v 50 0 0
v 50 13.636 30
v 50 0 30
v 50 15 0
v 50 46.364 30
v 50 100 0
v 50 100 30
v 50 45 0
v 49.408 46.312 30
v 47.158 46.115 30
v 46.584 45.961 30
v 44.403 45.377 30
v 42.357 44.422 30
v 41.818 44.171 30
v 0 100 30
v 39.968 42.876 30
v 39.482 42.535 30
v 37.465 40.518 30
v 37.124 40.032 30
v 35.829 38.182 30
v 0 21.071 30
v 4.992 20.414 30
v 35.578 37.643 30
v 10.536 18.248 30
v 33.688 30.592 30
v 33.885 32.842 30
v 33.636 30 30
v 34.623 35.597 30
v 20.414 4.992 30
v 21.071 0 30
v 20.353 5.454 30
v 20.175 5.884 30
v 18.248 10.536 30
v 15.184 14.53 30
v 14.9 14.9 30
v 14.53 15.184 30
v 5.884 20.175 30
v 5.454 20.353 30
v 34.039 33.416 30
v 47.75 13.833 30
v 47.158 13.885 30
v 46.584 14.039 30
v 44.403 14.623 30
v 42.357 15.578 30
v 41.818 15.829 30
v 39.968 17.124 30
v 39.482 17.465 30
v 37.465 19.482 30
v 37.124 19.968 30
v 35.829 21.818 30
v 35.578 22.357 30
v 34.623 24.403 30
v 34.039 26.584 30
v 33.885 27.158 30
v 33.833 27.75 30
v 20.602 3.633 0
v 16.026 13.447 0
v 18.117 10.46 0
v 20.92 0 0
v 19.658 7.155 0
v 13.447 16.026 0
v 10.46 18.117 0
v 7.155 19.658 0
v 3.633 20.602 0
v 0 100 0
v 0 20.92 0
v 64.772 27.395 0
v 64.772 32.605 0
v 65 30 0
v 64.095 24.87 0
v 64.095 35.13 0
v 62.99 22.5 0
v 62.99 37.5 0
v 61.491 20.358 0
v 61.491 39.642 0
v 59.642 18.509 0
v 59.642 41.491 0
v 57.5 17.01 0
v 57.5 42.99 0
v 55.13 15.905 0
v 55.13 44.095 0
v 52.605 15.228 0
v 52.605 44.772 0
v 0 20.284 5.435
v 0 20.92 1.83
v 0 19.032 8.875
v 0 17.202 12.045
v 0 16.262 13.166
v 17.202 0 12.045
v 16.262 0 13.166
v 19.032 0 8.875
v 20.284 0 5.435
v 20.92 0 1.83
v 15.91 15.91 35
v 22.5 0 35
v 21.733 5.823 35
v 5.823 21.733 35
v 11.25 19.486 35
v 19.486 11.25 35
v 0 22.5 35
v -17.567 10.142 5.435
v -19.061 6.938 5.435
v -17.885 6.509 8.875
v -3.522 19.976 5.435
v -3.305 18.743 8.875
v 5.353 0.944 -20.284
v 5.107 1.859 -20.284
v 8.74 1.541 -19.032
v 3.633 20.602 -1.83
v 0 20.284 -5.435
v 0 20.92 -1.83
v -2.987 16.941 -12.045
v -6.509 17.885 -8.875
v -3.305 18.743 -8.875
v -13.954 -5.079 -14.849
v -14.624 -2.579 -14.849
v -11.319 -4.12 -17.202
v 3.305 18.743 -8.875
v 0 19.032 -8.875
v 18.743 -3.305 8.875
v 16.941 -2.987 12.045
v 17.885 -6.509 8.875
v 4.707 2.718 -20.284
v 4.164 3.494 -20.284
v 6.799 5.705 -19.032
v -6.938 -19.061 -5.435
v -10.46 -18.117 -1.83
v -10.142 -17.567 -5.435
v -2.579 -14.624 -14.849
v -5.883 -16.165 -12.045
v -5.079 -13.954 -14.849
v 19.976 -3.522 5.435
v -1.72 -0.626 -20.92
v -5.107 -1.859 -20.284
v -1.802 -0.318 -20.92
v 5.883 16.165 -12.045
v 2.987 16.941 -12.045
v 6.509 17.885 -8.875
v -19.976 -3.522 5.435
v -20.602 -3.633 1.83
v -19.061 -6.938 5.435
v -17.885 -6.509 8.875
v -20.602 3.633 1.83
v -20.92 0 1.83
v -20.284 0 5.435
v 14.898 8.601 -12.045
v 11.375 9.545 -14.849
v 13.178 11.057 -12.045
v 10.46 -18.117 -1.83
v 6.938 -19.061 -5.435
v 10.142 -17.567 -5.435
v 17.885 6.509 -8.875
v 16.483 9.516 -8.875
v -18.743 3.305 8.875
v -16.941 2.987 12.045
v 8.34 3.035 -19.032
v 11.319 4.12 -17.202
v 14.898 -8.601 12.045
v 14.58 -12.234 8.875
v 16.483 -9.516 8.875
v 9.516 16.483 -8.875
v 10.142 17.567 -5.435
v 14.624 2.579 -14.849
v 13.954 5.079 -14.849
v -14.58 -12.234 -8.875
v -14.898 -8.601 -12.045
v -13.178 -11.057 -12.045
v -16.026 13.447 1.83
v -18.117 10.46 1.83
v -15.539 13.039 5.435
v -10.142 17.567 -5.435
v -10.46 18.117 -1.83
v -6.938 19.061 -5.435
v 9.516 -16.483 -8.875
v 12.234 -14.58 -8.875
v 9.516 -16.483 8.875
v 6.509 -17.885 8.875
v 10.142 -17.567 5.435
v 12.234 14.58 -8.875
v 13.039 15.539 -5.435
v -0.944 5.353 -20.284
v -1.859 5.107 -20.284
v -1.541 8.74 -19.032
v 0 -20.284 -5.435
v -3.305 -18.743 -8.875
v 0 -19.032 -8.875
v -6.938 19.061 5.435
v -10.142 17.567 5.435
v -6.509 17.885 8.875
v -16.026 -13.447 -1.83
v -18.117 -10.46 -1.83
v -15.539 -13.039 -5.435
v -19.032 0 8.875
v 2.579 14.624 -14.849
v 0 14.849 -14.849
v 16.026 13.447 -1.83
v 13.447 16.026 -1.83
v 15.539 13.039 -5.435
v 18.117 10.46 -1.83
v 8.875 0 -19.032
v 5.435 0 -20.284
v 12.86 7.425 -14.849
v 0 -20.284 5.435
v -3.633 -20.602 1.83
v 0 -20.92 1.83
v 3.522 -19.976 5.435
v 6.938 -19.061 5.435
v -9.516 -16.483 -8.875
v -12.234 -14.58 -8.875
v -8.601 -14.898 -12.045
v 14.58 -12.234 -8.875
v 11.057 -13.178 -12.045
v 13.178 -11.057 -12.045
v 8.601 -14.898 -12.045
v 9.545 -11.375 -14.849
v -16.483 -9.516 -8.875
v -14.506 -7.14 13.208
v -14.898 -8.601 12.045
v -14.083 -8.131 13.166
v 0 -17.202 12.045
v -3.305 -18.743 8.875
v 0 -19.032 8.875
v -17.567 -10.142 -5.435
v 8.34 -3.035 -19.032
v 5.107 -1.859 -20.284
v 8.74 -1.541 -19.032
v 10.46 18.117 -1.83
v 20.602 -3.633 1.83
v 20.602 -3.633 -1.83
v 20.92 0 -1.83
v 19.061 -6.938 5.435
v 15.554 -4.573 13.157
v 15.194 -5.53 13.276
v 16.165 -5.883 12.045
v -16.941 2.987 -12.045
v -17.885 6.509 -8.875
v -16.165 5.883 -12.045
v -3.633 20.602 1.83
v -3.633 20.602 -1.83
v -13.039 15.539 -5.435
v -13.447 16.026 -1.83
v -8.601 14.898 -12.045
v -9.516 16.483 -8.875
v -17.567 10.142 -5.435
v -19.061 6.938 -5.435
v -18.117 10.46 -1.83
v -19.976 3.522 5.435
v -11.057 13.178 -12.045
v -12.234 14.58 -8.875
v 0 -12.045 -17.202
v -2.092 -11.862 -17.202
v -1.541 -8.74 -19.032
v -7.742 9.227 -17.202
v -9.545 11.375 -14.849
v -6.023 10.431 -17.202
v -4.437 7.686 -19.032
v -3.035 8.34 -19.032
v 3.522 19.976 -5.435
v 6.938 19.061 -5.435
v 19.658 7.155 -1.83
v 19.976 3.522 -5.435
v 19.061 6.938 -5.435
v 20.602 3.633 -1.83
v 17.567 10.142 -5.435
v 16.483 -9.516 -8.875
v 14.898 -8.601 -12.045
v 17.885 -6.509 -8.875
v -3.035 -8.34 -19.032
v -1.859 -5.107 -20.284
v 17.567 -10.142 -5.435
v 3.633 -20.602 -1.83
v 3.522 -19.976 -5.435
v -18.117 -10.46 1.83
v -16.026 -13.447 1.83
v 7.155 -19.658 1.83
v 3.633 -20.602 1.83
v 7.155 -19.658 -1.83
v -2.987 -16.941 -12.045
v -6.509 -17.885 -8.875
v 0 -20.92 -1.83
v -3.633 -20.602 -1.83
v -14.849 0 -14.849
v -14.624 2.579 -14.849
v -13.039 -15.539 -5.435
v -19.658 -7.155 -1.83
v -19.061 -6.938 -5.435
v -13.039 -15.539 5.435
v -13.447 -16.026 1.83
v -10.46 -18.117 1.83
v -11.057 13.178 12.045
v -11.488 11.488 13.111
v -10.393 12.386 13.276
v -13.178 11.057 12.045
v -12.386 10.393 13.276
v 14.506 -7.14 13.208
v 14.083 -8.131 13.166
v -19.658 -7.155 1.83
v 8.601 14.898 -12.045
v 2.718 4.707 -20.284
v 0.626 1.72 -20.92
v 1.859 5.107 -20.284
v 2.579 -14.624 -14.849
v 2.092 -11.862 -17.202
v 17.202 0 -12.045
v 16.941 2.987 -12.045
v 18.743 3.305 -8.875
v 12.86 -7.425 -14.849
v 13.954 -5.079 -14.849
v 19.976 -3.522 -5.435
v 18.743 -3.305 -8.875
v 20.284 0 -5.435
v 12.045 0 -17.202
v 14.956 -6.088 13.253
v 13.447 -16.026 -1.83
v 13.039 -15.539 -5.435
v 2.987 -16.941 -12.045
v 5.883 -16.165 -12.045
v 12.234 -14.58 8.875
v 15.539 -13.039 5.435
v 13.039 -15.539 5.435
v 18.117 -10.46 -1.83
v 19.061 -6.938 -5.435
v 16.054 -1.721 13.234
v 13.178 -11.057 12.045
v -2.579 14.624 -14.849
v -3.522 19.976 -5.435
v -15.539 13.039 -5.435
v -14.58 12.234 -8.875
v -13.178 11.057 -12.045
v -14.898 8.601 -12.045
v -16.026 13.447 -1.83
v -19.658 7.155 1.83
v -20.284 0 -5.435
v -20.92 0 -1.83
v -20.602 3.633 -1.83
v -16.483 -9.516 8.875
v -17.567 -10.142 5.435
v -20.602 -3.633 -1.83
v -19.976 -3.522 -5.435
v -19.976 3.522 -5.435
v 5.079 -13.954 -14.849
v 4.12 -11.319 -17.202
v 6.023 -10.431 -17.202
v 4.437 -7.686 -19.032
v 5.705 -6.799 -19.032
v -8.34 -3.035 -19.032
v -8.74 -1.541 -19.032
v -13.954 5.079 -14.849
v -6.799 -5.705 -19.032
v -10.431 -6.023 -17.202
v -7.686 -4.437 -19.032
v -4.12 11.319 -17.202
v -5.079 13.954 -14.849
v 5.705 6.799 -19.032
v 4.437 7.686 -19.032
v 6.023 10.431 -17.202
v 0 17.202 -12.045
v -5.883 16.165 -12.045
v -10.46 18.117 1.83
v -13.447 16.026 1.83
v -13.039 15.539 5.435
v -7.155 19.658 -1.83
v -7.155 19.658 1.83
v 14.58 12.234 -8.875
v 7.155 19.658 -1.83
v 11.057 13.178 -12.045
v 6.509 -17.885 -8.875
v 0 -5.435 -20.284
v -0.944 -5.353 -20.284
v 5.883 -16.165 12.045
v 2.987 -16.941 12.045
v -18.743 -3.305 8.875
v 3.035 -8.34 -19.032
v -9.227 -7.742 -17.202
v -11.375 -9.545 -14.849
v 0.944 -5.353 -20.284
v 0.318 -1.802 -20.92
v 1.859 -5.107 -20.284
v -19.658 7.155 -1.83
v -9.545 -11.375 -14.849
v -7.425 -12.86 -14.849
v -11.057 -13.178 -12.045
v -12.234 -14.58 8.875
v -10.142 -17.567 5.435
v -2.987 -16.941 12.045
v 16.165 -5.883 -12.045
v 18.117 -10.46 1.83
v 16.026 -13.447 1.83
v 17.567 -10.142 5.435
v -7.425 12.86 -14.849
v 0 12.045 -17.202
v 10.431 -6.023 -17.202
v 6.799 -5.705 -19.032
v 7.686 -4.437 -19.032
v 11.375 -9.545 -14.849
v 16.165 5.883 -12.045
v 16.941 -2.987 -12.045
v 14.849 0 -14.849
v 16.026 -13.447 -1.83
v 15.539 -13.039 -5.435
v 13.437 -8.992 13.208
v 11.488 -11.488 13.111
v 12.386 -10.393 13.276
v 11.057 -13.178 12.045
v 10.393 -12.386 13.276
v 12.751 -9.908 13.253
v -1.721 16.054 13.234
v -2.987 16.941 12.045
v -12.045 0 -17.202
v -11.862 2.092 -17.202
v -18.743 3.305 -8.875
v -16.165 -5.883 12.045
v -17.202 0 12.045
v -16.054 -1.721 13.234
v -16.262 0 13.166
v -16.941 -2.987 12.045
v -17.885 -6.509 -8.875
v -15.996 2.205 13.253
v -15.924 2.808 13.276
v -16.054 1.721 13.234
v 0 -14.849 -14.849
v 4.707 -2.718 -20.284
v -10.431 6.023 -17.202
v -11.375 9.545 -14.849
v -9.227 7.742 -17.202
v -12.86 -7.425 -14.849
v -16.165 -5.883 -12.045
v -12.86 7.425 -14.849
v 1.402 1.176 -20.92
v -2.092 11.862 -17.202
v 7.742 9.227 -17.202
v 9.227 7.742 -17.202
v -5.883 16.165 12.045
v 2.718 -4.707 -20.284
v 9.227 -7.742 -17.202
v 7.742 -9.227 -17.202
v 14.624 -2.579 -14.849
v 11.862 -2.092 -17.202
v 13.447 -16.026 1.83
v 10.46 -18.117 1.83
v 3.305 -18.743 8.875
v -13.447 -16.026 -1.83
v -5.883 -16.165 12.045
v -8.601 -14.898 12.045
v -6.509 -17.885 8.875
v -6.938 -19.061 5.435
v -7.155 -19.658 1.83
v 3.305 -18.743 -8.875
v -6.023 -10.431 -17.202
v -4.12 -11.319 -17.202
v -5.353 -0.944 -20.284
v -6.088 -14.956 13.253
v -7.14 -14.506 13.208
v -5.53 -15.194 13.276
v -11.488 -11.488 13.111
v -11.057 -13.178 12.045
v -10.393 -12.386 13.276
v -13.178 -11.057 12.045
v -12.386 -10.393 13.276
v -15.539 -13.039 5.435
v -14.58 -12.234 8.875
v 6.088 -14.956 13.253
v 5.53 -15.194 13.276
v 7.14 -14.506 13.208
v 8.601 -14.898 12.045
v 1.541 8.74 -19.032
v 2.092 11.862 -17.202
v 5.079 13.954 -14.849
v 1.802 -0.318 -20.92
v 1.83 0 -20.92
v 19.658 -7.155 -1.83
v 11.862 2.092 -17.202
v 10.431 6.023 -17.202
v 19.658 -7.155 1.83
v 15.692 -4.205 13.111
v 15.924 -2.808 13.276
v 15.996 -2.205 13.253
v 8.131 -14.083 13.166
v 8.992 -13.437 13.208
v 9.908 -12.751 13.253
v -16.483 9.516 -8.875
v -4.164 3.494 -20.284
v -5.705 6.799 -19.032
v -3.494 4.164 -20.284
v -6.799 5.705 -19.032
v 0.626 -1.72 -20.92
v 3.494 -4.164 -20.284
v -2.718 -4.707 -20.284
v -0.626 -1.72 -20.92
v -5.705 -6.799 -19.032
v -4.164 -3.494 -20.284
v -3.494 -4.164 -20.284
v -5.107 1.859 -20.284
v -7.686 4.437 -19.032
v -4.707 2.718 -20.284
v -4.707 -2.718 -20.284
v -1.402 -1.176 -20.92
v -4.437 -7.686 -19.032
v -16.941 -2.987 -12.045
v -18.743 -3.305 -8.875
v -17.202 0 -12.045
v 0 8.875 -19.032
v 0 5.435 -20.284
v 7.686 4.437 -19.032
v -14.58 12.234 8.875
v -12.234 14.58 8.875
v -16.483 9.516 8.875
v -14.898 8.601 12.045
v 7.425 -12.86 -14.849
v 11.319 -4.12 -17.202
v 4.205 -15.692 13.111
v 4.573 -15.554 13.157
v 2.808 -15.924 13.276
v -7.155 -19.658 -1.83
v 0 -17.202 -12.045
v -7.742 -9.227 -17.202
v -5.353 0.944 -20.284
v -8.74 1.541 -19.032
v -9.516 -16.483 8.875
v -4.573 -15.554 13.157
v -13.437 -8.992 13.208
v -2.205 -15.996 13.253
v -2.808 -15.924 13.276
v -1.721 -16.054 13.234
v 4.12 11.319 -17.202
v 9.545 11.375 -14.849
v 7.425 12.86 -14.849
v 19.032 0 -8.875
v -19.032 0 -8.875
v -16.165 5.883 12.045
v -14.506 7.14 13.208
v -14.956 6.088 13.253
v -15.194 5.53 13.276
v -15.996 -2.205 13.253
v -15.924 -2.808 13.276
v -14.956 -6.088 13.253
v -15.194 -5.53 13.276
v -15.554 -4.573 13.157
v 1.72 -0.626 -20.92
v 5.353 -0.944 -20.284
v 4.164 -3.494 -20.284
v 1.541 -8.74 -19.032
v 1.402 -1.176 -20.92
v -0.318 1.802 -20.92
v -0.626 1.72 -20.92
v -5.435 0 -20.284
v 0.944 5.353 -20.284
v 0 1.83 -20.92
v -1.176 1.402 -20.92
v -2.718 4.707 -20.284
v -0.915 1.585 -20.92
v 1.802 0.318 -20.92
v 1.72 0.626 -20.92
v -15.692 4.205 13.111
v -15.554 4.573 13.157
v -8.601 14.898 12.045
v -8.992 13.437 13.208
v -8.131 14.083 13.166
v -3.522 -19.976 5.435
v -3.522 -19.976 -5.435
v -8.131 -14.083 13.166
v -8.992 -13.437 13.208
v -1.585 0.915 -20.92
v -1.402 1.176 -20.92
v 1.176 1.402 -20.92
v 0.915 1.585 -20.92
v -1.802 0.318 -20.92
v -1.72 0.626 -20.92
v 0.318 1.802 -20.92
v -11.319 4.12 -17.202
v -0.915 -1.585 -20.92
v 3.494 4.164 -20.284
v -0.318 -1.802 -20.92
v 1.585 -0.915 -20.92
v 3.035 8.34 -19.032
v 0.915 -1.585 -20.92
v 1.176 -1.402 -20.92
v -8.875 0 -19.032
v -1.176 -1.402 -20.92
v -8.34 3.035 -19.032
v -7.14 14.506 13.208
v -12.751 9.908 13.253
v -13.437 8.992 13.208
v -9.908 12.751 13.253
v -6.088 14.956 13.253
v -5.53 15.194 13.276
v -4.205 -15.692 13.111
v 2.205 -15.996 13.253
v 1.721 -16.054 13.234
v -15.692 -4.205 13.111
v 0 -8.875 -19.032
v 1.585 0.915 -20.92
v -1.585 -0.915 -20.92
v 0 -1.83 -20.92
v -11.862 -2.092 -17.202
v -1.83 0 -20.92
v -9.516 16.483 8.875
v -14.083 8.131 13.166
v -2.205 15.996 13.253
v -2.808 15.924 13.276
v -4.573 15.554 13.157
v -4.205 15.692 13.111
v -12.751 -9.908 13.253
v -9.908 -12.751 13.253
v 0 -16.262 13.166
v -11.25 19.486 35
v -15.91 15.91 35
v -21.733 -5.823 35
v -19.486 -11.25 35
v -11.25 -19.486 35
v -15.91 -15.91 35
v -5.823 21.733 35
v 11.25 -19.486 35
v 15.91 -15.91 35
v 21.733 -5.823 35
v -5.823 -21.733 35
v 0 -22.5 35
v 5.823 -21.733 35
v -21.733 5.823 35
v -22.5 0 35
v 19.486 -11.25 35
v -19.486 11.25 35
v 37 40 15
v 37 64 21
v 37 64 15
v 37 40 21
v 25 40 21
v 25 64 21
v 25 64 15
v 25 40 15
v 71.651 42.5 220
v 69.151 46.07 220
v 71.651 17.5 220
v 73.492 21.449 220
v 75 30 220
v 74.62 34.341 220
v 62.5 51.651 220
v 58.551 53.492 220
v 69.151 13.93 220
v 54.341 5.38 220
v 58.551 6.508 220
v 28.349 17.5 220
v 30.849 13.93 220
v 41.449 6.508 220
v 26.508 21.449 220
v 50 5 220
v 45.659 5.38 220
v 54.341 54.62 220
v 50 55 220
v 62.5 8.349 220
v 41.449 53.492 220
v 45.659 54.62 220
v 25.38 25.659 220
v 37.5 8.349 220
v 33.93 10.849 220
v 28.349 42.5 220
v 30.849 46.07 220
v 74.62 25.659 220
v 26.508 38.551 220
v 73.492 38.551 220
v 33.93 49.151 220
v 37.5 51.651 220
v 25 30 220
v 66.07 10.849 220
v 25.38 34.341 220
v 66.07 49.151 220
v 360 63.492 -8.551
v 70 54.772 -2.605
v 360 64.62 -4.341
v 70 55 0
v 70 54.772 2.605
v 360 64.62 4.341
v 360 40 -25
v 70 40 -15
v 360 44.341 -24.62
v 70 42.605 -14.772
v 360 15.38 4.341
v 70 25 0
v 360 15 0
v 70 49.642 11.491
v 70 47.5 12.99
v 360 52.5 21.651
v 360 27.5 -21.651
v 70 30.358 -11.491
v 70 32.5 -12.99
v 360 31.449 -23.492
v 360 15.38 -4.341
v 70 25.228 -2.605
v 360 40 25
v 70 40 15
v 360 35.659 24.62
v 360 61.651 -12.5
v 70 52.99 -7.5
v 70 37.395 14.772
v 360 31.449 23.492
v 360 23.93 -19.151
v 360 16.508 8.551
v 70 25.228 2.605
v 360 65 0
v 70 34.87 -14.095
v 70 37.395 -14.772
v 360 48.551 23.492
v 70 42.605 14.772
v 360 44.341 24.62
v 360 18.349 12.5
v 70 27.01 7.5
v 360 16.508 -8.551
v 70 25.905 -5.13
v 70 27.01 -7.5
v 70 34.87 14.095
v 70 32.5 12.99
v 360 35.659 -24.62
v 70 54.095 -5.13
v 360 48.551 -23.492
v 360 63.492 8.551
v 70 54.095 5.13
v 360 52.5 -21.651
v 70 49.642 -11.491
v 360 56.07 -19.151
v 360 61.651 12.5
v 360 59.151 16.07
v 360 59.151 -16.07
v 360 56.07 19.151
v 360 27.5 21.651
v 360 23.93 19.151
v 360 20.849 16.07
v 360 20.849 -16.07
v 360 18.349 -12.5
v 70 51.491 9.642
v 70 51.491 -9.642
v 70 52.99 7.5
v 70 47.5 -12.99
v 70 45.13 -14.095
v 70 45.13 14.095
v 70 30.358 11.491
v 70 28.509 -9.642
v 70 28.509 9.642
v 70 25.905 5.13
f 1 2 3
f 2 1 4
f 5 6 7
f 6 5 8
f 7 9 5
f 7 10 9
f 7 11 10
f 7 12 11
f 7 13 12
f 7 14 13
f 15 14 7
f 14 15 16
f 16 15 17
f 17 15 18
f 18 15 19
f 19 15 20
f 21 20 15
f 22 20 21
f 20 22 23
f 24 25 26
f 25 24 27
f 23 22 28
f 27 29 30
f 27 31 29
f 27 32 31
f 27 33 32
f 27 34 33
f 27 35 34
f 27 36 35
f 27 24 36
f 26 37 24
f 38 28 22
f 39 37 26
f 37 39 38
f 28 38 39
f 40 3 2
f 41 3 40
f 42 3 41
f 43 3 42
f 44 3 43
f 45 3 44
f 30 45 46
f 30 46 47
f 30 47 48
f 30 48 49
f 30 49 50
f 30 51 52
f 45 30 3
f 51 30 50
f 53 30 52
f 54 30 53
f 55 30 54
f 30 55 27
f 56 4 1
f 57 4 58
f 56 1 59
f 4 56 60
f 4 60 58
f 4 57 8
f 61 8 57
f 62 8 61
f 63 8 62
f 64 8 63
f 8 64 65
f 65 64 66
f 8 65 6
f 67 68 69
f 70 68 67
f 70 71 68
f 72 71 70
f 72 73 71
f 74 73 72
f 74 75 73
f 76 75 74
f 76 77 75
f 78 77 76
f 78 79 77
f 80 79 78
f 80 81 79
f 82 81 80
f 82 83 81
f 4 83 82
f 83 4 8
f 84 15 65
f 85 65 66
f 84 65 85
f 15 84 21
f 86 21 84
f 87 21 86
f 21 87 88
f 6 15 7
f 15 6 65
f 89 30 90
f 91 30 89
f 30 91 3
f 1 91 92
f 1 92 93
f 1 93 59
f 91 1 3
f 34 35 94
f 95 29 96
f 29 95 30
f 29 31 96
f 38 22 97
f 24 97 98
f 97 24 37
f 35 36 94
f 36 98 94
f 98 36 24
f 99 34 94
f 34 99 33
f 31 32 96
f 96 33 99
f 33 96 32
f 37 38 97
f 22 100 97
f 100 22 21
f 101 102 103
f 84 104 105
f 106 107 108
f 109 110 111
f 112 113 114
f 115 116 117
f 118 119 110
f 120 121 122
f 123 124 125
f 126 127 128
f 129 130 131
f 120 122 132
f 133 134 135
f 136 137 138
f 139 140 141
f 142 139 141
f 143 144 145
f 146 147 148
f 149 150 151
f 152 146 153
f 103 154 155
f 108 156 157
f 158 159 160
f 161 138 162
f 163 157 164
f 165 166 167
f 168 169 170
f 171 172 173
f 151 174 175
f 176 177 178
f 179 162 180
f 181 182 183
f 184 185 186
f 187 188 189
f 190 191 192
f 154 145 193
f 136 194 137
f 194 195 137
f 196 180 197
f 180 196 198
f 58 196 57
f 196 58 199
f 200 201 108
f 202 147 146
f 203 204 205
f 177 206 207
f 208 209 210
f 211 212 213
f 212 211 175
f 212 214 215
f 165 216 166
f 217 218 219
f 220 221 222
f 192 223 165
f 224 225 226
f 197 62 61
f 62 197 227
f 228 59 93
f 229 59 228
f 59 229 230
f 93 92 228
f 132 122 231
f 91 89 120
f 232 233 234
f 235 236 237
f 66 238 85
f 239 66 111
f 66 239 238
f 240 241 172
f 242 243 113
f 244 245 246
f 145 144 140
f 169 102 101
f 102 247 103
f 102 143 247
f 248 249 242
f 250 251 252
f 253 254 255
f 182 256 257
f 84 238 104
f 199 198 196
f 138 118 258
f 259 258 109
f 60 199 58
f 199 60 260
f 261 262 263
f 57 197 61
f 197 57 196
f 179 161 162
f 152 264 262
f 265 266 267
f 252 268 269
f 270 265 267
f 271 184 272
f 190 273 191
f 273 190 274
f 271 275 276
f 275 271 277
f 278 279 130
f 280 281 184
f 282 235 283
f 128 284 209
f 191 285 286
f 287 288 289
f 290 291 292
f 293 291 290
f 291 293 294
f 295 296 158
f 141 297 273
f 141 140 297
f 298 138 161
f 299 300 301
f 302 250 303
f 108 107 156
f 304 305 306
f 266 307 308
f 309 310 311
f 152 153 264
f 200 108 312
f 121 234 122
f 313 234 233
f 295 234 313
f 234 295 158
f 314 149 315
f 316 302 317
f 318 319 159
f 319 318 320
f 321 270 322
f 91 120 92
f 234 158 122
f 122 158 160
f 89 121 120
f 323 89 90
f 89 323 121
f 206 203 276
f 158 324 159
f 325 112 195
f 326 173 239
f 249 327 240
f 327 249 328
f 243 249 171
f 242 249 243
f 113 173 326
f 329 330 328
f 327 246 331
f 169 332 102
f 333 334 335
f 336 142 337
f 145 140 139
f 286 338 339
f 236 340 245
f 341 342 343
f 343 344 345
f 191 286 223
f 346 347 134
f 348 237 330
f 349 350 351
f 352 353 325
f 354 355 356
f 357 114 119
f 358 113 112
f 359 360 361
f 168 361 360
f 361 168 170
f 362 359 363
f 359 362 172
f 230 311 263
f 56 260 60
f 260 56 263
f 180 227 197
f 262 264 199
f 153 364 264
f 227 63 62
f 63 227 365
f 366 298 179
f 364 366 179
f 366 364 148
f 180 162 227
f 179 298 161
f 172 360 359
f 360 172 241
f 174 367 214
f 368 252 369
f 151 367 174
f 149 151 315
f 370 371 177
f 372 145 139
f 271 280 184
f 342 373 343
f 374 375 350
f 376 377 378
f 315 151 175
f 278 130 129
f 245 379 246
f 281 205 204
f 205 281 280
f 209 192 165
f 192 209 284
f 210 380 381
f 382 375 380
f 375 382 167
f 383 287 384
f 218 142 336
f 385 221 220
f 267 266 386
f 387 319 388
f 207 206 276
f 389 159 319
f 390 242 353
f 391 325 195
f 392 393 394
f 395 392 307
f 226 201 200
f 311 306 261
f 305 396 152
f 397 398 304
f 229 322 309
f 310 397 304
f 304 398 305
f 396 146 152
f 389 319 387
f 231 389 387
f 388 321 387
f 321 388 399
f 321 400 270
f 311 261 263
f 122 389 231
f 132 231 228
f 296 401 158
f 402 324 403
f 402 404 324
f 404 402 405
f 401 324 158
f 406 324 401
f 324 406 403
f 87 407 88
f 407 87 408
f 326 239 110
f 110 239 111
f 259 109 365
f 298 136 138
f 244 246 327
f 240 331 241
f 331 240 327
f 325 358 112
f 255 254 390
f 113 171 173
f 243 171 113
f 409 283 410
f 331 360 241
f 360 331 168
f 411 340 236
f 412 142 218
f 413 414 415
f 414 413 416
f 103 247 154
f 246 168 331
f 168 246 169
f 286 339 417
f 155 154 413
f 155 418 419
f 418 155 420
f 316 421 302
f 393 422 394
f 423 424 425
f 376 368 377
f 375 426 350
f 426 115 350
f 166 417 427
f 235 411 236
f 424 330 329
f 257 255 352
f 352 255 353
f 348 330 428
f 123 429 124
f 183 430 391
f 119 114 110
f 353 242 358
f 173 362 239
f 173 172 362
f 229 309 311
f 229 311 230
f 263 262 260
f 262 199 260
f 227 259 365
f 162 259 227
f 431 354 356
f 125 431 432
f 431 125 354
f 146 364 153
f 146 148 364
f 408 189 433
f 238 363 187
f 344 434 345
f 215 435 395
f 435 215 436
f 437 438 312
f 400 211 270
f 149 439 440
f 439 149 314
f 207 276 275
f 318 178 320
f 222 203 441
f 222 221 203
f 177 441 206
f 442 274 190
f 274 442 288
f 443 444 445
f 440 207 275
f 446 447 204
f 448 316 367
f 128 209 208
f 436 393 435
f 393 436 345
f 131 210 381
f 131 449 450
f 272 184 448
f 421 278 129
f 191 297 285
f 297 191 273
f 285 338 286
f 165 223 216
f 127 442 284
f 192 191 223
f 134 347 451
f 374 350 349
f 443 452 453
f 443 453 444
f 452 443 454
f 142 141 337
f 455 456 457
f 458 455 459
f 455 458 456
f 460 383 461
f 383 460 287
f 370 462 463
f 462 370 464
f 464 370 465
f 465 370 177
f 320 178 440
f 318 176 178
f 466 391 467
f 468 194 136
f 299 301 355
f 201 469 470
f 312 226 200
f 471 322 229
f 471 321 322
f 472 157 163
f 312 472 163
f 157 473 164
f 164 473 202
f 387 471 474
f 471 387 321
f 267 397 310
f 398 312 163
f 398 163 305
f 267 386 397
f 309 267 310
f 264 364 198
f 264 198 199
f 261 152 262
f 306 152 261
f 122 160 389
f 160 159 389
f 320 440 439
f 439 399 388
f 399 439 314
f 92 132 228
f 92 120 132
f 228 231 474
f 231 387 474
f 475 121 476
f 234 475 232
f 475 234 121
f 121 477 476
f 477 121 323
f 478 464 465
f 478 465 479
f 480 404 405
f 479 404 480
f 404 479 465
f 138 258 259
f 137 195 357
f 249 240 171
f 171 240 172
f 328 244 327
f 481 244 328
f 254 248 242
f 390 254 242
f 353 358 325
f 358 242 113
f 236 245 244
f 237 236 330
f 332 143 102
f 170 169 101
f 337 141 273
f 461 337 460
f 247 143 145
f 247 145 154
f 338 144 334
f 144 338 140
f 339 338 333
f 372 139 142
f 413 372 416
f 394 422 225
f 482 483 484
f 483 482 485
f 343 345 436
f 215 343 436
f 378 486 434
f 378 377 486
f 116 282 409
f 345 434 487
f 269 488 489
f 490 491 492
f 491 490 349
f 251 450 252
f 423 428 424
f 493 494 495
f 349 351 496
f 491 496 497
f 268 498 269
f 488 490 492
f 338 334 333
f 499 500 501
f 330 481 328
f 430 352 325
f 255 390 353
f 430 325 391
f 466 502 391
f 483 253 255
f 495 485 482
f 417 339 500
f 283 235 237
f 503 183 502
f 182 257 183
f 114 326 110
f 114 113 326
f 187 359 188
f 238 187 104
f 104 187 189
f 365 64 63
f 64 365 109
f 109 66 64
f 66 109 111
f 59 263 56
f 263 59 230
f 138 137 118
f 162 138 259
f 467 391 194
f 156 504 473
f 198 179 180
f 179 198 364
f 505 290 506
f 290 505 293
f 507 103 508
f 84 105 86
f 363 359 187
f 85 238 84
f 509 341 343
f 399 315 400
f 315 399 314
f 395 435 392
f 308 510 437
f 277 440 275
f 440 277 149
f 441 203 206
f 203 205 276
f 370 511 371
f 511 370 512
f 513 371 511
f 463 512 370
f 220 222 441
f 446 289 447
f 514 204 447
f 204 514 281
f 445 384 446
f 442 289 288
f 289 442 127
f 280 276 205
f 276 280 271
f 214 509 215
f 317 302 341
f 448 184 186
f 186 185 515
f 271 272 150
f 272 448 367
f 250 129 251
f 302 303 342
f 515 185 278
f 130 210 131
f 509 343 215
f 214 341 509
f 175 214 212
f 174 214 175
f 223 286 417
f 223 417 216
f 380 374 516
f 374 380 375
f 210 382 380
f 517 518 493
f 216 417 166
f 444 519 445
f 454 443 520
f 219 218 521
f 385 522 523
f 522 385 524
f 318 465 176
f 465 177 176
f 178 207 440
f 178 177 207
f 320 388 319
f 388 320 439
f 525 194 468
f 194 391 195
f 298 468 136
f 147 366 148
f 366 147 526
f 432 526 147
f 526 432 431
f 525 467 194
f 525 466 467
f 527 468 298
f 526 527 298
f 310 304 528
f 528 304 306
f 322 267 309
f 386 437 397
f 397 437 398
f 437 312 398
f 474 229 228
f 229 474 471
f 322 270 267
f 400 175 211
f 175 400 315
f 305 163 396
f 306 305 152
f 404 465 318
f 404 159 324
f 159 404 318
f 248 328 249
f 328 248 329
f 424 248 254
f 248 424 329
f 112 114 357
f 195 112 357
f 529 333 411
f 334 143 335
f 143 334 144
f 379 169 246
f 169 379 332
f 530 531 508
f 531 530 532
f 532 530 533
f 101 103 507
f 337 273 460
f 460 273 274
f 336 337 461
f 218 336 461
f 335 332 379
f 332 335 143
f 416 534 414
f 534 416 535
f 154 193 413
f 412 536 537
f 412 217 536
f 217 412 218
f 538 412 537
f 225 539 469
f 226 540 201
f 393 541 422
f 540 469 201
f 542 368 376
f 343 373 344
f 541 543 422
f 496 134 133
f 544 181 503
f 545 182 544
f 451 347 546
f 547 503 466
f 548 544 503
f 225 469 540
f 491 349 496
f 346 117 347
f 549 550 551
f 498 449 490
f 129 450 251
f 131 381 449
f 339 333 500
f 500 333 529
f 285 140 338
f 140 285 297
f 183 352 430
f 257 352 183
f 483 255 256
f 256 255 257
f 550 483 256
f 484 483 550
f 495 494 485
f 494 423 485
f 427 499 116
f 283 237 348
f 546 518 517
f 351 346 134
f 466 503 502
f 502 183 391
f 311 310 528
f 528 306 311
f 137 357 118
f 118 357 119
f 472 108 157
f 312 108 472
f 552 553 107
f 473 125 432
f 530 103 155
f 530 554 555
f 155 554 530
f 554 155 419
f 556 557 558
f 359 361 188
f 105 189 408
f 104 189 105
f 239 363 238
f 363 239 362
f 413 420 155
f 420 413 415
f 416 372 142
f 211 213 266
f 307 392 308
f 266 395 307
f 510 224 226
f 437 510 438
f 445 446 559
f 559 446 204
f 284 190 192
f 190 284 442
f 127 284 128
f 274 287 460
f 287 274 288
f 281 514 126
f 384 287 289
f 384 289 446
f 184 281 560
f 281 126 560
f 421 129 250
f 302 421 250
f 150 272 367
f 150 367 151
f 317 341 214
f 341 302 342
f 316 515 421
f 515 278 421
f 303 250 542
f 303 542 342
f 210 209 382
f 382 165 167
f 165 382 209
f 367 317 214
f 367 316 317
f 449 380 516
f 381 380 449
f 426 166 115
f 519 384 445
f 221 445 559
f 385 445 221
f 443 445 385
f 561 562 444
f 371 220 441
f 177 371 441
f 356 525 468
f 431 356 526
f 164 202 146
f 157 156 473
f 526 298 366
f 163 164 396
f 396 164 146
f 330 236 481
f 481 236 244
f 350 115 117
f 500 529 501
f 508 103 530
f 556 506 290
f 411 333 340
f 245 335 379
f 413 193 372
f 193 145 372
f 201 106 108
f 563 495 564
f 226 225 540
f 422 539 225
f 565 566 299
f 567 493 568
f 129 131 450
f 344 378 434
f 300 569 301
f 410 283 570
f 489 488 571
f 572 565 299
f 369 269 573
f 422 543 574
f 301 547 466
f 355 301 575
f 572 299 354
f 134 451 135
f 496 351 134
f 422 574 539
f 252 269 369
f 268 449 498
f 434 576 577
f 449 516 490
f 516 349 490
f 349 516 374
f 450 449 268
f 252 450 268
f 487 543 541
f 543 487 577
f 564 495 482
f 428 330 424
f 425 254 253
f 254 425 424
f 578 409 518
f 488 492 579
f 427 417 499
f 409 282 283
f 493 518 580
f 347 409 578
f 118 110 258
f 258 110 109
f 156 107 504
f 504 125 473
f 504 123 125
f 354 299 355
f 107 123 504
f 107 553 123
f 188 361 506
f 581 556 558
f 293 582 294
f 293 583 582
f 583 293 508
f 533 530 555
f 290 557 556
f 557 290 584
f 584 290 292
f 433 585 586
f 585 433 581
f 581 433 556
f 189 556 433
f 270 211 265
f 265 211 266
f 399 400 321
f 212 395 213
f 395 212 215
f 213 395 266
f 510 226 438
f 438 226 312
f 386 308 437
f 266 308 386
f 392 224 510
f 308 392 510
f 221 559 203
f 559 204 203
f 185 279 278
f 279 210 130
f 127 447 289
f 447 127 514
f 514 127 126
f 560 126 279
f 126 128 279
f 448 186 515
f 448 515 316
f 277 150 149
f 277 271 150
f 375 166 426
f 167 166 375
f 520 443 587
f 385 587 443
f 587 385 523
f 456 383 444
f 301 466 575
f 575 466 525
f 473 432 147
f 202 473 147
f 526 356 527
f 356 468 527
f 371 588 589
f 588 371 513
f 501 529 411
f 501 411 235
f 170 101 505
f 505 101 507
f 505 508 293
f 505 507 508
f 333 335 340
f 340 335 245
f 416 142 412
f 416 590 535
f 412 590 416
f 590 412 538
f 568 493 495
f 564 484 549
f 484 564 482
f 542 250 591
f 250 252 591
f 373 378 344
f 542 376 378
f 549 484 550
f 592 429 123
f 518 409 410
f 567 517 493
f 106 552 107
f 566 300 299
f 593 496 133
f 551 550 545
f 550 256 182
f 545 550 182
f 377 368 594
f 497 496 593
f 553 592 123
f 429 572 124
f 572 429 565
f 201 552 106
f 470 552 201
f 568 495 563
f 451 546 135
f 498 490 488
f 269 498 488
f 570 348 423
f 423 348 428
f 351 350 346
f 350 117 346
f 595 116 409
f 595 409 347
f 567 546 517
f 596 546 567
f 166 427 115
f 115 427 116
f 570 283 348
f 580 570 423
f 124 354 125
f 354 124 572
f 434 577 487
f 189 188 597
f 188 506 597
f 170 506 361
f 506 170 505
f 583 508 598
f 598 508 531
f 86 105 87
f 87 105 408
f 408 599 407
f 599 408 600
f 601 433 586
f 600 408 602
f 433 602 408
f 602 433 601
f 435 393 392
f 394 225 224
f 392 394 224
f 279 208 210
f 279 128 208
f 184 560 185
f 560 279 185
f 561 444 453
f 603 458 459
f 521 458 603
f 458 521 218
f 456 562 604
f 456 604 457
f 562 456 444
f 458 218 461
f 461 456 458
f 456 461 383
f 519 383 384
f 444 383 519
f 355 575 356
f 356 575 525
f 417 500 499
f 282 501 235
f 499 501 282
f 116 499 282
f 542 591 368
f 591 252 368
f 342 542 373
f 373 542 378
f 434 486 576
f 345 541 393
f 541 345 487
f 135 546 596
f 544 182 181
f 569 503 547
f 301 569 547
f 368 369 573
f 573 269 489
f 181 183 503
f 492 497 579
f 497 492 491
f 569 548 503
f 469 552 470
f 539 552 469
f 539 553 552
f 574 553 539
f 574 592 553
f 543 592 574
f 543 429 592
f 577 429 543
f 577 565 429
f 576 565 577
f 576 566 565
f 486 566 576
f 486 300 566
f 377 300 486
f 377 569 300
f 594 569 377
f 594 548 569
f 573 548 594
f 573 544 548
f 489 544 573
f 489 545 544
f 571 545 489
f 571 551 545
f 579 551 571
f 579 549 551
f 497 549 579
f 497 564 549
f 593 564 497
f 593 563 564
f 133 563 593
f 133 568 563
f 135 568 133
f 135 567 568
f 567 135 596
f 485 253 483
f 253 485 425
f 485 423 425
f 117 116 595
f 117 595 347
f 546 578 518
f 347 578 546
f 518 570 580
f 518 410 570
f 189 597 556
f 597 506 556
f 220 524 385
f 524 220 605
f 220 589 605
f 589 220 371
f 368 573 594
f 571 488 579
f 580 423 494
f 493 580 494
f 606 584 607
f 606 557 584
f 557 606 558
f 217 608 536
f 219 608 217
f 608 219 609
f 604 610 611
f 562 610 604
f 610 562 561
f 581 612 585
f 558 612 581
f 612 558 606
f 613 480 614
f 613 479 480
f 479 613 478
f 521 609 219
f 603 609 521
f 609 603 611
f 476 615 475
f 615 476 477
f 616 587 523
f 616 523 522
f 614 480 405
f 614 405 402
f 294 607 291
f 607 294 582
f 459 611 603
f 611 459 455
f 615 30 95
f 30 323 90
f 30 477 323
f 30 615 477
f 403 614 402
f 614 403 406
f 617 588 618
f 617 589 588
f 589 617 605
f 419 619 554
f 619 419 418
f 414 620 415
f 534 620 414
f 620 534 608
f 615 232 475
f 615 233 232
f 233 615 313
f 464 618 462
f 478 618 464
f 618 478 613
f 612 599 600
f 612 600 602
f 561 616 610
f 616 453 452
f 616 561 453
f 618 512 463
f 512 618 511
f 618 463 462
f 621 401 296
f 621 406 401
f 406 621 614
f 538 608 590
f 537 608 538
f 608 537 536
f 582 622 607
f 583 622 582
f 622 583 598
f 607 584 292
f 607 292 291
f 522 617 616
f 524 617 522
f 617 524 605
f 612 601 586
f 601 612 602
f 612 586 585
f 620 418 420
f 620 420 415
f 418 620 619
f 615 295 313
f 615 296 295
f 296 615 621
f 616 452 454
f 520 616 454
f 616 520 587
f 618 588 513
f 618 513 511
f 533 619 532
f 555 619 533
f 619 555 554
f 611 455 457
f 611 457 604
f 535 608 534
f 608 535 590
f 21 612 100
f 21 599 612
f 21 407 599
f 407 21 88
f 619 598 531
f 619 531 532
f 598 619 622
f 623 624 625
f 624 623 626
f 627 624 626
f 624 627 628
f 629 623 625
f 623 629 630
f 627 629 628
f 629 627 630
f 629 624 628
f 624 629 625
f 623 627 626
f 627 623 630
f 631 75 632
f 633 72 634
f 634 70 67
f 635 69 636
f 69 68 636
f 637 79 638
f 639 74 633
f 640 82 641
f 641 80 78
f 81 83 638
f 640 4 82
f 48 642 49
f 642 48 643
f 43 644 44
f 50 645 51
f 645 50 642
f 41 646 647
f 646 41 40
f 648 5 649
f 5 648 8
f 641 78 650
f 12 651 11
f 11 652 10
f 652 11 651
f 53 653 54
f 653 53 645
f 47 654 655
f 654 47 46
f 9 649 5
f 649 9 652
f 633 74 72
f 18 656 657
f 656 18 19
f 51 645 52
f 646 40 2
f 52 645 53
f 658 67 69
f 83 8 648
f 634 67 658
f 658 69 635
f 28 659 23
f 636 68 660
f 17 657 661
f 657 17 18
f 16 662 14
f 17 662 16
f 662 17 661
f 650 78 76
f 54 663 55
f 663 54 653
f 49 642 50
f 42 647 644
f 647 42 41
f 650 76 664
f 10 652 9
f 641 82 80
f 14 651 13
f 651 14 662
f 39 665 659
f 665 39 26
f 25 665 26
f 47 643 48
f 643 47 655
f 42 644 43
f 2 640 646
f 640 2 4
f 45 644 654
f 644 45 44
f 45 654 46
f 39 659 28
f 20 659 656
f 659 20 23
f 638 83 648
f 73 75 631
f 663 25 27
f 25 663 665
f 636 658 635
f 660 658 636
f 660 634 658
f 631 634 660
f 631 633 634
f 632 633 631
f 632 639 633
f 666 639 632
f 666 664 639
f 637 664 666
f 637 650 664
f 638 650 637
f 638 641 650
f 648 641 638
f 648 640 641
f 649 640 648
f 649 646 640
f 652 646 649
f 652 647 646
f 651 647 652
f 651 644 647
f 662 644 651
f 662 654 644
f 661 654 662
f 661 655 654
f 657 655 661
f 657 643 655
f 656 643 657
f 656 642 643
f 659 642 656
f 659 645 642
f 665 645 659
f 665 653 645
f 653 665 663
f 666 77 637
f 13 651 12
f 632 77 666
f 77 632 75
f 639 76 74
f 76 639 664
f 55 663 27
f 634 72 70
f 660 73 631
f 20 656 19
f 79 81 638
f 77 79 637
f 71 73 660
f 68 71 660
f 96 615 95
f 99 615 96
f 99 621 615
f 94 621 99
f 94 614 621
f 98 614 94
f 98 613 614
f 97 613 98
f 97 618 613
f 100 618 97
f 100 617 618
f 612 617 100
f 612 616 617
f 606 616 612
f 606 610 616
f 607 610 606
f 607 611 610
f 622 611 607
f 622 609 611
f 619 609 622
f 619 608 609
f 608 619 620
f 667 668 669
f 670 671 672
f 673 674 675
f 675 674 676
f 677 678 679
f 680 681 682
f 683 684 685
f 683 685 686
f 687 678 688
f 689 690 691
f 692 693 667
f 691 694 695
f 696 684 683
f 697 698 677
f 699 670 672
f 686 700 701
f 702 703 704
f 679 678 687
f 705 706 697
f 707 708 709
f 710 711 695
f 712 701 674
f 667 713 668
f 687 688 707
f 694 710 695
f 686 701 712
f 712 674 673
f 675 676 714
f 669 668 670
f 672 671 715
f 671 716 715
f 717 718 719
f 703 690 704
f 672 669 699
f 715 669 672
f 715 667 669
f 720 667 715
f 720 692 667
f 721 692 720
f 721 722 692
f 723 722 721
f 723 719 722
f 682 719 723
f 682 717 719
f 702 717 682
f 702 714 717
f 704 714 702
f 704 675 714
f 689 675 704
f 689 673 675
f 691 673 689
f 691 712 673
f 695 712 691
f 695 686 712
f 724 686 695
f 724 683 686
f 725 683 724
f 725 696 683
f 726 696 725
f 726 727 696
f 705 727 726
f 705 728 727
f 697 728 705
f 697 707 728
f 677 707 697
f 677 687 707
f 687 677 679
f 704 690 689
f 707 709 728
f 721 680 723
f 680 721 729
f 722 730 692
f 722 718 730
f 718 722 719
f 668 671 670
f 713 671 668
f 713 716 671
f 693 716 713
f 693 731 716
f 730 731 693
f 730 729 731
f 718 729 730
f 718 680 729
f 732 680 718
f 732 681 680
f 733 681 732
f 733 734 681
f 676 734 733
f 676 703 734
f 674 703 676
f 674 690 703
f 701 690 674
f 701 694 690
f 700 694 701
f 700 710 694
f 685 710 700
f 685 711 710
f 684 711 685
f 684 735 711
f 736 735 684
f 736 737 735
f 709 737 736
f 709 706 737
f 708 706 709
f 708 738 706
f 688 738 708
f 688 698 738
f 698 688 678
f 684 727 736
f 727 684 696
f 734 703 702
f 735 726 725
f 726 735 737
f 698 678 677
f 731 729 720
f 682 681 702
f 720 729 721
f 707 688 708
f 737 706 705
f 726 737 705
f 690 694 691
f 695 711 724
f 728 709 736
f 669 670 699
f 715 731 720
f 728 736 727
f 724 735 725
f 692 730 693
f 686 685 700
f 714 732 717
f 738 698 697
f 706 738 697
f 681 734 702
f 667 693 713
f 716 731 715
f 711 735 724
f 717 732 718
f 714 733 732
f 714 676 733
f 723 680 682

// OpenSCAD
// * Discription what the *.scad is about ect.

// ==================================
// = Used Libraries =
// ==================================

// ==================================
// = Variables =
// ==================================

/* [Tab Name_1] */
// sizing printing or print a small part to test the object.
DesignStatus="sizing"; // ["sizing","fitting","printing","Fit to Printbed"]
// Variables seen by customizer

//Printplate dimensions
PrintPlate_X=250;
PrintPlate_Y=210;
PrintPlate_Z=210;
PrintPlate_Margin=2;

TestSlab_X=50;
TestSlab_Y=100;
TestSlab_Z=30;

/* [Tab Name_2] */
TestCylinder_H=35;
TestCylinder_D1=25;
TestCylinder_D2=45;

TestSphere_D=42;

module __Customizer_Limit__ () {}  // before these, the variables are usable in the cutomizer
shown_by_customizer = false;

Invisible=42;
TestslabTransl_X=25;
TestslabRotate_X=30;

// === Facettes Numbers ===

FN_HexNut=6;
FN_Performance=36;
FN_FooBaa=12;
// Divisebile by 4 to align Cylinders whithout small intersections taht cause problems due to smal holes in surfaches and self intersections on round objects

FN_Rough=12;
FN_MediumRough=16;
FN_Medium=36;
FN_Fine=72;
FN_ExtraFine=144;
// ==================================
// = Tuning Variables =
// ==================================
// Variables for finetuning (The Slegehammer if something has to be made fit)

// ==================================
// = Customizer Section =
// ==================================
if (DesignStatus=="printing"){
/*
    Provide all necessary settings to print all parts, aka: Number of facettes $fn, Orientation (xy-plane = printplate)
        * Prin plate settings: (X&Y-Dimension)
*/
}
if(DesignStatus=="fitting"){
    intersection(){
        translate([0,0,1]){
            cube([1000,1000,1],center=true);
        }
        Main_Assembly(16,76,"false",SHOW_PrintPlate="NO");
    }
}
if (DesignStatus=="sizing"){
    Main_Assembly(16,36,"true",SHOW_PrintPlate="NO");
}
if (DesignStatus=="Fit to Printbed"){
    PRINTPLATE_AREA(PrintPlate_X,PrintPlate_Y,PrintPlate_Z,PrintPlate_Margin){
        translate([PrintPlate_Margin/2,PrintPlate_Margin/2,PrintPlate_Margin/2]){
            Main_Assembly(36,76,"false", SHOW_PrintPlate="YES");
        }
    }
}
// ==================================
// = MAINASSEMBLY =
// ==================================
// LOW_RESOLUTION: low reaulution value to speed up preview
// HIGH_RESOLUTION: high resolution value for rendering the .stl
// CUT_MODULES_RENDERED: decides if the cuttingmodules get renderred to see them. use cuttingmodules twice one time within the final part to cut and one time to just schow it.
// Main_Assembly(12,76,true);
module Main_Assembly(LOW_RESOLUTION=12,HIGH_RESOLUTION=36,CUT_MODULES_RENDERED,SHOW_PrintPlate="YES"){
$fn = $preview ? LOW_RESOLUTION : HIGH_RESOLUTION ; // Facets in preview (F5) set to 12, in Reder (F6) is set to 72
    see_me_in_colourful(){
        translate([0,0,0]){
            difference(){
                TEST_OBJECT();
                translate([25,40,15]){                    
                    scale([0.4,0.4,0.4]){        
                        TEST_CUTCUBE();
            }
        }
    }
        }
        translate([50,30,0]){
            cylinder(h=220,d1=30, d2=50);
        }        
        translate([0,0,0]){
            difference(){
                TEST_SPHERE();
                
            }
        }
        translate([0,0,0]){
        }
        translate([0,0,0]){
            if(CUT_MODULES_RENDERED=="true"){
                TEST_CUTCYLINDER();
            }
            else{
                echo("CUT_MODULES_RENDERED= ",CUT_MODULES_RENDERED);
            }
        }
        translate([70,40,0]){
            rotate([0,90,0]){
                cylinder(h=290,d1=30, d2=50);
            }
        }
        union(){
            
        }
        translate([ 0,0,0]){
        }
    }
//    if(SHOW_PrintPlate=="YES"){
//        PRINTPLATE_AREA(PrintPlate_X,PrintPlate_Y,PrintPlate_Z,PrintPlate_Margin){}
//    }
}
// ===============================================================================
// = Module to help coloring different modules to make it easier 
// ===============================================================================
module see_me_in_colourful(){ // iterates the given modules and colors them automaticly by setting values using trigonometric funktions
    translate([0,0,0]){
        for(i=[0:1:$children-1]){
            a=255;
            b=50;       // cuts away the dark colors to prevent bad visual contrast to backgound
            k_farbabstand=((a-b)/$children);
            Farbe=((k_farbabstand*i)/255);
            SINUS_Foo=0.5+(sin(((360/(a-b))*k_farbabstand)*(i+1)))/2;
            COSIN_Foo=0.5+(cos(((360/(a-b))*k_farbabstand)*(i+1)))/2;
            color(c = [ SINUS_Foo,
                        1-(SINUS_Foo/2+COSIN_Foo/2),
                        COSIN_Foo],
                        alpha = 0.5){  
                difference(){
                    render(convexity=10){children(i);} //renders the modules, effect is that inner holes become visible
                    //children(i);
                    translate([70/2,0,0]){
                        //cube([80,90,150],center=true);
                    }
// Creates a Cutting to see a Sidesection cut of the objects
                    color(c = [ SINUS_Foo,
                                1-(SINUS_Foo/2+COSIN_Foo/2),
                                COSIN_Foo],
                                alpha = 0.0){
                        translate([70/2,0,0]){
                            //cube([30,20,150],center=true);
                        }
                        translate([-50,-50,0]){
                            //cube([100,50,200],center=false);
                        }
                    }
                }
            }
        }
    }
}
// ===============================================================================
// =--------------------------------- Enviroment Modules ------------------------=
// ===============================================================================
// Modules that resembles the Enviroment aka the helmet where to atach a camera mount or the Dimensions of a printarea
//PRINTPLATE_AREA(PrintPlate_X=250,PrintPlate_Y=210,PrintPlate_Z=210,PrintPlate_Margin=2);
module PRINTPLATE_AREA(PrintPlate_X=250,PrintPlate_Y=210,PrintPlate_Z=210,PrintPlate_Margin=2){
COLOR=100/256;
    intersection(){
                color(c=[COLOR*1.3,COLOR*1.3,COLOR*1.3],alpha = 0.4){
                    difference(){    
                        cube([PrintPlate_X,PrintPlate_Y,PrintPlate_Z]);
                        translate([PrintPlate_Margin/2,PrintPlate_Margin/2,PrintPlate_Margin/2]){
                            cube([PrintPlate_X-PrintPlate_Margin,PrintPlate_Y-PrintPlate_Margin,PrintPlate_Z-PrintPlate_Margin]);
                        }
                    }
                }
            children();
        }
    // Out of Print Volume
    intersection(){ 
        difference(){
            translate([-PrintPlate_X/4,-PrintPlate_Y/4,-PrintPlate_Z/4]){
                cube([PrintPlate_X+PrintPlate_X/2,PrintPlate_Y+PrintPlate_Y/2,PrintPlate_Z/2+PrintPlate_Z/2]);
            }
            translate([0,0,0]){
                cube([PrintPlate_X,PrintPlate_Y,PrintPlate_Z]);
            }
       }
       children();
   }
    // Wire Frame Print Volume
    difference(){
        translate([0,0,-PrintPlate_Margin/2]){
            cube([PrintPlate_X,PrintPlate_Y,PrintPlate_Z]);
            translate([PrintPlate_Margin/2,PrintPlate_Margin/2,PrintPlate_Margin/2]){
                cube([PrintPlate_X-PrintPlate_Margin,PrintPlate_Y-PrintPlate_Margin,PrintPlate_Z-PrintPlate_Margin]);
            }
        }
        translate([PrintPlate_Margin/2,PrintPlate_Margin/2,0]){
            union(){
                translate([-PrintPlate_Margin,0,0]){
                    cube([PrintPlate_X+PrintPlate_Margin,PrintPlate_Y-PrintPlate_Margin,PrintPlate_Z-PrintPlate_Margin]);
                }
                translate([0,-PrintPlate_Margin,0]){
                    cube([PrintPlate_X-PrintPlate_Margin,PrintPlate_Y+PrintPlate_Margin,PrintPlate_Z-PrintPlate_Margin]);
                }
                translate([0,0,-PrintPlate_Margin]){
                    cube([PrintPlate_X-PrintPlate_Margin,PrintPlate_Y-PrintPlate_Margin,PrintPlate_Z+PrintPlate_Margin]);
                }
            }
        }
    }
    children();
}
// ===============================================================================
// =--------------------------------- Modules -----------------------------------=
// ===============================================================================
//TEST_OBJECT();

module TEST_OBJECT(){
    difference(){
        TEST_CUTCUBE(TestSlab_X,TestSlab_Y,TestSlab_Z);
        TEST_CUTCYLINDER();
    }
    TEST_SPHERE();
}

module TEST_CUTCUBE(X=30,Y=60,Z=15){
    cube([X,Y,Z]);
}
module TEST_SPHERE(D=TestSphere_D){
//$fn = $preview ? 12 : 72; // Facets in preview (F5) set to 12, in Reder (F6) is set to 72
    difference(){
        sphere(d=D);
        TEST_CUTCYLINDER();
    }
}
module TEST_CUTCYLINDER(H=TestCylinder_H,D1=TestCylinder_D1,D2=TestCylinder_D2){
    cylinder(h=H,d1=D1,d2=D2,$fn=24);
}

// ===============================================================================
// ---------------------------------- Cutting Modules ----------------------------
// ===============================================================================
//Press_Fit_Cut(33,14,17,0.8);
module Press_Fit_Cut(Angle=22,Thickness=11,Length=22,Width=0.2){
    rotate([0,0,Angle]){
        translate([0,0,Thickness/2]){
            cylinder(h=Thickness,d=Width,center=true,$fn=12);
        }
        translate([0,-Width/2,0]){
            cube([Length,Width,Thickness]);
        }
        translate([Length,0,Thickness/2]){
            cylinder(h=Thickness,d=Width,center=true,$fn=12);
        }
    }
}

//Screwcutter(100,10,100,4,1,5);
module Screwcutter( SCREW_HEAD_h=200,
                    SCREW_HEAD_d=40,
                    SCREW_BOLT_h=200,
                    SCREW_BOLT_d=3,
                    SCREW_CAMPFER_h,
                    SCREW_CAMPFER_d=SCREW_BOLT_d    ){
    translate([0,0,-SCREW_HEAD_h]){
        cylinder(h=SCREW_HEAD_h,d=SCREW_HEAD_d,$fn=32);
    }
    translate([0,0,0]){
        cylinder(h=SCREW_CAMPFER_h,d2=SCREW_BOLT_d,d1=SCREW_CAMPFER_d,$fn=32);    
    }
    translate([0,0,0]){
        cylinder(h=SCREW_BOLT_h,d=SCREW_BOLT_d,$fn=32);
    }
}
//Bolt(25,3,8,3);
module Bolt(BOLTLENGTH,BOLTDIAMETER,HEADDIAMETER,HEADHEIGHT){
    cylinder(h=BOLTLENGTH,d=BOLTDIAMETER,center=false,$fn=FN_Performance);
    translate([0,0,-HEADHEIGHT/2]){
        cylinder(h=HEADHEIGHT,d=HEADDIAMETER,center=true,$fn=6);
        cylinder(h=HEADHEIGHT,d=HEADDIAMETER,center=true,$fn=6);
    }
}
//Projection_Cutter(3){sphere(10);};
module Projection_Cutter(Offset_z){    
    projection(cut = true){
        translate([0,0,Offset_z]){
            children();
        }
    }
}
// ===============================================================================
// ---------------------------------- Intersection Modules -----------------------
// ===============================================================================

module Intersection_Test_Cut(PLAIN,THICKNESS,OFFSET){
// ==== EXAMPLE ====
//    !Intersection_Test_Cut("xy",1,7/2){sphere(7);};
// ==== EXAMPLE ====
    if (PLAIN=="xz"){
        intersection(){
            children();
            translate([0,OFFSET,0]){
                cube([100,THICKNESS,100],center=true);
            }
        }
    }
    else if (PLAIN=="xy") {
        intersection(){
            children();
            translate([0,0,OFFSET]){
                cube([500,500,THICKNESS],center=true);
            }
        }
    }
    else if (PLAIN=="yz") {
        intersection(){
            children();
            translate([OFFSET,0,0]){
                cube([THICKNESS,100,100],center=true);
            }
        }   
    }
}
// ===============================================================================
// ---------------------------------- Linear Extrude Modules ---------------------
// ===============================================================================

//Ring_Shaper(3,15,1.5);
module Ring_Shaper(HEIGHT,OUTER,WALLTHICKNESS){
    linear_extrude(HEIGHT){
        2D_Ring_Shape(OUTER,WALLTHICKNESS);
    }
}
//Linear_Extruding(10,-1){2D_Rounded_Square_Base_Shape(10,20,3);}
module Linear_Extruding(ExtrudeLength,ExrtudingDirektionInverter){
//   0  Normal
//  -1  inverted
//   1  
    Length=ExtrudeLength;
    translate([0,0,Length*ExrtudingDirektionInverter]){
        linear_extrude(height=ExtrudeLength){
            children();
        }
    }
}

// ===============================================================================
// ---------------------------------- Rotate Extrude Modules ---------------------
// ===============================================================================

//DONUT(1,20,1,7);
module DONUT(DIAMETER,DIAMETER_RING,SCAL_X,SCAL_Y){
//DIAMETER The dough part
//DIAMETER_RING The hole part
//SCAL_X, skales the x dimension
//SCAL_Y, skales the y dimension
    rotate_extrude(angle=360,convexity=3,$fn=FN_Fine){
        translate([DIAMETER_RING,0,0]){
            scale([SCAL_X,SCAL_Y,1]){
                circle(d=DIAMETER,$fn=FN_Fine);
            }
        }
    }
}
// ===============================================================================
// =--------------------------------- 2D-Shapes ---------------------------------=
// ===============================================================================

//2D_Ring_Shape(20,1);
module 2D_Ring_Shape(OUTER_D,WALLTHICKNESS){
    difference(){
        circle(d=OUTER_D,$fn=FN_Fine);
        circle(d=OUTER_D-2*WALLTHICKNESS,$fn=FN_Fine);
    }
}
//2D_Rounded_Square_Base_Shape(10,20,3);
module 2D_Rounded_Square_Base_Shape(DIMENSION_X=10,DIMENSION_Y=20,RADIUS=2,CENTER=true){
    if(CENTER){
        translate([0,0,0]){
            minkowski(){
                square([DIMENSION_X-RADIUS*2,DIMENSION_Y-RADIUS*2],center=CENTER);
                circle(r=RADIUS,$fn=FN_Fine);
            }
        }
    }
    else{
        translate([RADIUS,RADIUS,0]){
            minkowski(){
                square([DIMENSION_X-RADIUS*2,DIMENSION_Y-RADIUS*2],center=CENTER);
                circle(r=RADIUS,$fn=FN_Fine);
            }
        }
    }
}
//HEX_Mesh_Pattern(){ Mesh(2.5,2.5);}
module HEX_Mesh_Pattern(X=10,Y=30,DELTA=5,GRPL_X=45,GRPL_Y=115){
Count_X=X;
Count_Y=Y;
DIMENSION_X=35;
DIMENSION_Y=67;


//DELTA=1;

X_STEPP=5.5+DELTA;
Y_STEPP=7.5+DELTA;

k=DELTA; //Distance between Hexshapes may be HEX_D/4 is good
HEX_D=(DIMENSION_X-((Count_X-1)*k/2))/(Count_X-1);

SCALE_Y=DIMENSION_Y/((HEX_D/2+k/4)*sqrt(3)*(Count_Y-1));
echo("HEX_D*Count_Y",HEX_D*(Count_Y));
echo("GrindingPlate_Y",DIMENSION_Y);
echo("SCALE_Y",SCALE_Y);

//square([15,(HEX_D/2+k/4)*sqrt(3)*(Count_Y-1)]); // Helper Foo
    
// +++++++++++++++++++++++++++++++++++++++++
    scale([1,SCALE_Y,1]){
        union(){
            for(j=[0:1:Count_Y-1]){
                for(i=[0:1:Count_X-1-j%2]){
                    translate([i*(HEX_D+k/2),0,0]){
                        translate([(HEX_D/2+k/4)*(j%2),
                                    j*((HEX_D/2+k/4)*sqrt(3)),
                                    0]                          ){
                        //translate([0,j*Y_STEPP,0]){
                        rotate([0,0,60]){
                            //Mesh(0.5){square([HEX_D,HEX_D*1.2],center=true);}
                            circle(d=HEX_D,$fn=6);
                        }
                            //children();
                        }
                    }
                }
            }
        }
    }
}
//Mesh(4){square([7,10],center=true);}
module Mesh(RADIUS=0.0){
minkowski(){
    children();
    circle(r=RADIUS,$fn=144);
    }
}
// ===============================================================================
// =--------------------------------- Symetrie Helper ---------------------------=
// ===============================================================================
// XY_Symetrie(10,25){cube(10);}
module XY_Symetrie(X=10,Y=25){
   translate([X,Y,0]){
       children();
       }
    mirror([1,0,0]){
        translate([X,Y,0]){
            children();
       }
    }
    mirror([0,1,0]){
        translate([X,Y,0]){
            children();
        }
        mirror([1,0,0]){
            translate([X,Y,0]){
                children();
            }
        }
    }
}
module MirrorMirrorOnTheWall(Offset_X,Offset_Y){
    translate([-Offset_X,Offset_Y,0]){
        children();
        mirror([0,1,0]){
            children();
        }
    }
    translate([Offset_X,-Offset_Y,0]){
        mirror([1,0,0]){
            children();
            mirror([1,0,0]){
                children();
            }
        }
    }
}
// ===============================================================================
// =--------------------------------- Textembossing -----------------------------=
// ===============================================================================

// ===============================================================================
// =--------------------------------- Smoothing ---------------------------------=
// ===============================================================================
2D_Smooth_r=1;
// Radius of a outer Tip Rounding 
2D_Fillet_r=1;
// Radius of a inner corner Ronding
2D_Chamfer_DELTA_INN=1;
2D_Chamfer_DELTA_OUT=2;
// a straigt line on edges and corners
2D_Chamfer_BOOLEAN=false;    
module Smooth(r=3){
    //$fn=30;
    offset(r=r,$fn=30){
        offset(r=-r,$fn=30){
        children();
        }
    }
}
module Fillet(r=3){
    //$fn=30;
    offset(r=-r,$fn=30){
        offset(r=r,$fn=30){
            children();
        }
    }
}
module Chamfer_OUTWARD(DELTA_OUT=3){
    //$fn=30;
    offset(delta=DELTA_OUT,chamfer=true,$fn=30){
        offset(delta=-DELTA_OUT,chamfer=true, $fn=30){
            children();
        }
    }
}
module Chamfer_INWARD(DELTA_INN=3){
    //$fn=30;
    offset(delta=-DELTA_INN,chamfer=true,$fn=30){
        offset(delta=DELTA_INN,chamfer=true, $fn=30){
            children();
        }
    }
}
// ===============================================================================
// =--------------------------------- Ruthex --------------------------------=
// ===============================================================================
// Dimensions for Ruthex Tread inseerts
//RUTHEX_M3();
module RUTHEX_M3(){    
L=5.7+5.7*0.25; // Length + Margin
echo("RUTHEX",L);
D1=4.0;    
    translate([0,0,0]){
        rotate([0,0,0]){
            translate([0,0,0]){
                cylinder(h=L,d1=D1,d2=D1,$fn=FN_Performance);
            }
        }
    }
}
// ===============================================================================
// =--------------------------------- Import STL --------------------------------=
// ===============================================================================
module NAME_OF_IMPORT(){
    rotate([0,0,-90]){
        translate([-515,-100,-45]){
            import("PATH/TO/FILE.stl",convexity=3);
        }
    }
}
// ===============================================================================
// =--------------------------------- Import PNG --------------------------------=
// ===============================================================================
module NAME_OF_IMPORT(){
    rotate([0,0,-90]){
        translate([-515,-100,-45]){
            import("PATH/TO/FILE.PNG",convexity=3);
        }
    }
}
